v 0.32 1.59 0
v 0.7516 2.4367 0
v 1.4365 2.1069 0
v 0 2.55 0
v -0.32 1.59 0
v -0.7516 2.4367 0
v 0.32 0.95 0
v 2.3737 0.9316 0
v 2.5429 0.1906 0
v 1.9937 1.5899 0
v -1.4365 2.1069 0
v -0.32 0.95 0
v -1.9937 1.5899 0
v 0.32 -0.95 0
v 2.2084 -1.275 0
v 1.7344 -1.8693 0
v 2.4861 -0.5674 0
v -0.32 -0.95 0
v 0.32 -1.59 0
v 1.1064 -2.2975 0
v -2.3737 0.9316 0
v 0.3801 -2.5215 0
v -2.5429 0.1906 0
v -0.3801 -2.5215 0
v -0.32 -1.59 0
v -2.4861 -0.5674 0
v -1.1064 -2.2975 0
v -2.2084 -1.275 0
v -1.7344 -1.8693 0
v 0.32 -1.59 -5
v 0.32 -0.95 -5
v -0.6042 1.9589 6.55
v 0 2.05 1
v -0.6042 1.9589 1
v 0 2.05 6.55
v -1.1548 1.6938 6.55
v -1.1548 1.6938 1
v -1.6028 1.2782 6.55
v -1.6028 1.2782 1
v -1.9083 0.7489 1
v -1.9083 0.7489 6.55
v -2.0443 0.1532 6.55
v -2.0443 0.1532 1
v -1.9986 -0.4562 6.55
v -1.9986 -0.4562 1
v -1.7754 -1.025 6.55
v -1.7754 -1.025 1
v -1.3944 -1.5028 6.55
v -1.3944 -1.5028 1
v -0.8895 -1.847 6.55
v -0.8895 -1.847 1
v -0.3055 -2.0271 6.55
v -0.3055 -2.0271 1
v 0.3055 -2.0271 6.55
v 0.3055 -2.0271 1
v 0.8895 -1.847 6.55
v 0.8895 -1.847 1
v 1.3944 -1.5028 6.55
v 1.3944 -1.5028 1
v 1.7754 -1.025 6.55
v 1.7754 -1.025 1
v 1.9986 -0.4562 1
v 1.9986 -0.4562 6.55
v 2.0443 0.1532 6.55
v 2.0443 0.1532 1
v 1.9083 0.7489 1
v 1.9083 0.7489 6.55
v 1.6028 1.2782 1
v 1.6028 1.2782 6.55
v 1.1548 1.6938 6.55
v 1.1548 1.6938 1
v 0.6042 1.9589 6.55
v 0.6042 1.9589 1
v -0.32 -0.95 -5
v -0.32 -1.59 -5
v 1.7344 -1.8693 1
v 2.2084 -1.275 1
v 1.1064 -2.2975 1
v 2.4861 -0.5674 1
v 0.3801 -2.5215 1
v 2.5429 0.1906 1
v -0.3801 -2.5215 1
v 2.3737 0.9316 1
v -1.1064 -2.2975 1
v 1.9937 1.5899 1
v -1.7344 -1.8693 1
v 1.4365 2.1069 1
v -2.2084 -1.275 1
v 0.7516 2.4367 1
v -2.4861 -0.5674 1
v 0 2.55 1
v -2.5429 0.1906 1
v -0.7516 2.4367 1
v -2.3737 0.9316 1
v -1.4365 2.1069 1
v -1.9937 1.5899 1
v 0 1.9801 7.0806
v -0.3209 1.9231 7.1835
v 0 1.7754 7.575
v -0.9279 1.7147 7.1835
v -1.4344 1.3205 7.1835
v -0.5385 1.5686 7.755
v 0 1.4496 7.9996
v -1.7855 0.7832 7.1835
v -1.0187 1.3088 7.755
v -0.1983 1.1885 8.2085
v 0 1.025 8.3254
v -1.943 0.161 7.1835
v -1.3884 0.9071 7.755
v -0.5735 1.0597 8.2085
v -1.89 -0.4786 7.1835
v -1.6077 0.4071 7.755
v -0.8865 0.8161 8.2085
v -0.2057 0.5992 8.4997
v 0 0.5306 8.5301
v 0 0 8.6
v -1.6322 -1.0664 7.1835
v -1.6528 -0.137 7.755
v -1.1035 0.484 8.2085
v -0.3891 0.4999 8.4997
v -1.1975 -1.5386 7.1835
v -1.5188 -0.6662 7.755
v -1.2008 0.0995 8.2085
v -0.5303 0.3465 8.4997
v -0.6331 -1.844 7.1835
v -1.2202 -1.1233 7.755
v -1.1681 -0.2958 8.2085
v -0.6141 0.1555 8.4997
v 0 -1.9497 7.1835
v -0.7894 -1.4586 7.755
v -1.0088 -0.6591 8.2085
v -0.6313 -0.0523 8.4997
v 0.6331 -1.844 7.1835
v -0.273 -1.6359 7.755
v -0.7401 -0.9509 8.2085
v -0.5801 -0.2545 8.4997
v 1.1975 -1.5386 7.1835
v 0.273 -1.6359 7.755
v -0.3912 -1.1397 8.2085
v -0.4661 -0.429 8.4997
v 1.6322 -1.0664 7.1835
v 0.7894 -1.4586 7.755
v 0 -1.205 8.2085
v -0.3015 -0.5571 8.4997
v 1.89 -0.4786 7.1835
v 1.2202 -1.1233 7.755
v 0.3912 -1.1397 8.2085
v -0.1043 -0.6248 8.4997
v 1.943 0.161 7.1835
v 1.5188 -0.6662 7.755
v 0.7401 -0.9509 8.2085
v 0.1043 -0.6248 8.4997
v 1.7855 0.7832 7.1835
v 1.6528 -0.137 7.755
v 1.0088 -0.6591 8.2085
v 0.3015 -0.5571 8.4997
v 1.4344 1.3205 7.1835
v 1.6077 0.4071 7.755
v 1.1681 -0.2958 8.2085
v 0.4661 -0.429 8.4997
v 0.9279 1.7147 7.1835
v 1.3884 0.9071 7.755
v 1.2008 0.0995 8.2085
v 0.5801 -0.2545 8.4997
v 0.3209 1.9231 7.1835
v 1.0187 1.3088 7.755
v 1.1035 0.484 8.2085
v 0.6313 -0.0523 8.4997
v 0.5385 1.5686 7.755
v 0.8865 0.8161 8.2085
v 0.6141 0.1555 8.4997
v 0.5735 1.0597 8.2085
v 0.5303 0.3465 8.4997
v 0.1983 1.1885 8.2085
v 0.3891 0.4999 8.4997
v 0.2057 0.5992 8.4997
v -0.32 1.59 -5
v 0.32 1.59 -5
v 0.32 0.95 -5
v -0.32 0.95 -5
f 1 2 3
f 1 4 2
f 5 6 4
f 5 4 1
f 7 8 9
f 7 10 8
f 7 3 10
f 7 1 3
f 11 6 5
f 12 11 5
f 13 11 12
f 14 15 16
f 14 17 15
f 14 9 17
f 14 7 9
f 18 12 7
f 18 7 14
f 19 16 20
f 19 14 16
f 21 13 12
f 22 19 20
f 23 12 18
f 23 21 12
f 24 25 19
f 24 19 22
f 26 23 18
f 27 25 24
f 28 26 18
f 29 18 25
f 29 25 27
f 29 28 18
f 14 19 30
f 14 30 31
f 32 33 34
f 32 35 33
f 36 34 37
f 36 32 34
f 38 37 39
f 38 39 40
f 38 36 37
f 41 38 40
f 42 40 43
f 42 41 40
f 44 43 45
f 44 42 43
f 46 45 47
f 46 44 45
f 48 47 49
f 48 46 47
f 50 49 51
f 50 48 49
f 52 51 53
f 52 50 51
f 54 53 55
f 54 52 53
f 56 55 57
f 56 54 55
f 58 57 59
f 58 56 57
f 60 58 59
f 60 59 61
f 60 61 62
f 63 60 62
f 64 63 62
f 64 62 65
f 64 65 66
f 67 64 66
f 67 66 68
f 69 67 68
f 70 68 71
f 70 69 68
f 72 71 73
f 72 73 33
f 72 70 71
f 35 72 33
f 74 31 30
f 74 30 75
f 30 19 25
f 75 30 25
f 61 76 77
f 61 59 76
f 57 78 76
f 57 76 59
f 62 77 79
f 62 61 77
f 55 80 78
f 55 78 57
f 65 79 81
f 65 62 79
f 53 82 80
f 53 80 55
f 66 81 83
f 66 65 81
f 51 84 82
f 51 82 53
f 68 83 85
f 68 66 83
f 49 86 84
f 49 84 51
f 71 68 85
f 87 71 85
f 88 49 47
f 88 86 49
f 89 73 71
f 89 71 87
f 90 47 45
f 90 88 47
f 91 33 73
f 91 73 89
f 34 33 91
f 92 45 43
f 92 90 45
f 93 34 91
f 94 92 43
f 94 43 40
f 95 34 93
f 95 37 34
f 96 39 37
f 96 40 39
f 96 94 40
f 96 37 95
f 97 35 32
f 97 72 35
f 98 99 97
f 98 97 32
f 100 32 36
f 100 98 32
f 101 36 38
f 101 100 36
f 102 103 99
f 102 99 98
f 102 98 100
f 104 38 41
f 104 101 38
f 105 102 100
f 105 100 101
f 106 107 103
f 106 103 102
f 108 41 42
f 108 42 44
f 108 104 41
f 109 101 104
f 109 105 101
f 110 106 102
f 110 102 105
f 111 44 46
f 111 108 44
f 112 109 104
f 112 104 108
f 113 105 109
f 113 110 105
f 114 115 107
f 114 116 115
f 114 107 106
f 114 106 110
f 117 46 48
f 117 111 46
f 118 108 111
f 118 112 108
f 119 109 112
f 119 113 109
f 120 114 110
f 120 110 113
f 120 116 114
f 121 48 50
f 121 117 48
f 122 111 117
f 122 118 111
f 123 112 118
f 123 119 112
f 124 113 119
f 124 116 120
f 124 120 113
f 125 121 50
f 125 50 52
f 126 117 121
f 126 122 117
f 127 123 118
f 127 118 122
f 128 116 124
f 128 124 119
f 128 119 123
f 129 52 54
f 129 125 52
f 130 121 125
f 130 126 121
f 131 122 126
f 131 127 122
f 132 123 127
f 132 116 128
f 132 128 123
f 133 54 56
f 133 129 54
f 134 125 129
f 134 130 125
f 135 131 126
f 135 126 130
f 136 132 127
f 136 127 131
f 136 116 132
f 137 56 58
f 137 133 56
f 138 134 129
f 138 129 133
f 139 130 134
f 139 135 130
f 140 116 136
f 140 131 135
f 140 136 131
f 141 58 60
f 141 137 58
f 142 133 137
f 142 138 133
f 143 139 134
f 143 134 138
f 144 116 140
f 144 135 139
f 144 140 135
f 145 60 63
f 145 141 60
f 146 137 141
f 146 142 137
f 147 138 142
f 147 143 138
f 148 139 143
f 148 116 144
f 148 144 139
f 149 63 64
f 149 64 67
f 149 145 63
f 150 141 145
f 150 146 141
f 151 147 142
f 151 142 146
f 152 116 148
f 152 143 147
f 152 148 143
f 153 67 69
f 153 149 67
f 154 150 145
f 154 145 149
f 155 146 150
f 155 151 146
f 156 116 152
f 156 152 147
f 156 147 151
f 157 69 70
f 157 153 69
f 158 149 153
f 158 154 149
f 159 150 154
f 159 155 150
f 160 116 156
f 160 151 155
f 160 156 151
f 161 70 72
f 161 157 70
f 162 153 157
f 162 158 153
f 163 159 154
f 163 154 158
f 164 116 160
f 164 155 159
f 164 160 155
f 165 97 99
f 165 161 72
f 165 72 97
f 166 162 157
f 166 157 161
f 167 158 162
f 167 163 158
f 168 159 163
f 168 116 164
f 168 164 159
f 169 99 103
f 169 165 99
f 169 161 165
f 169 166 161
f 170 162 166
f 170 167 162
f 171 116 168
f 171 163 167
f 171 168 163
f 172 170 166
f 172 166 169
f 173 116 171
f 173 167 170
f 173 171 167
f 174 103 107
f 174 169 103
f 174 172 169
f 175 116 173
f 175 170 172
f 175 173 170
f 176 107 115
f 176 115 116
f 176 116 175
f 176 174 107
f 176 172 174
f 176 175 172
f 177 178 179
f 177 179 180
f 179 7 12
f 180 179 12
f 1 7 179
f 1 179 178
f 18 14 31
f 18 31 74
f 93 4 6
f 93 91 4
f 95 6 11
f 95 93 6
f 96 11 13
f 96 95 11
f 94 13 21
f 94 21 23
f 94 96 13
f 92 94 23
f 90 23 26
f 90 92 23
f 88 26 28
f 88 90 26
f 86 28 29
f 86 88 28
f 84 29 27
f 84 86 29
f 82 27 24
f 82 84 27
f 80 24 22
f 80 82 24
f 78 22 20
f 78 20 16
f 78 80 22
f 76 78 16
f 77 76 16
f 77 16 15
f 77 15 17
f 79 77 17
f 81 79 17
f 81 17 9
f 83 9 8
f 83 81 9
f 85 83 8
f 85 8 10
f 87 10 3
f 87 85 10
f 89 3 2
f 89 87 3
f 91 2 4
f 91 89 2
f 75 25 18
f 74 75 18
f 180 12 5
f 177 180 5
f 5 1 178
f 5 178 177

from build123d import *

# Parameters (mm, degrees)
SKETCH3_W           = 0.64
SKETCH3_H           = 0.64
BOSS_EXTRUDE1_DEPTH = 5


with BuildPart() as part:
    # Sketch2 → Base-Revolve (revolve)
    with BuildSketch(Plane(origin=(0, 0, 0), x_dir=(0, 0, -1), z_dir=(1, 0, 0))):
        with BuildLine():
            Line((0, 0), (0, 2.55))
            Line((0, 2.55), (-1, 2.55))
            Line((-1, 2.55), (-1, 2.05))
            Line((-1, 2.05), (-6.55, 2.05))
            ThreePointArc((-6.55, 2.05), (-7.999568901, 1.449568901), (-8.6, 0))
            Line((-8.6, 0), (0, 0))
        make_face()
    revolve(axis=Axis((0, 0, 0), (0, 0, 1)))

    # Sketch3 → Boss-Extrude1 (add)
    with BuildSketch(Plane(origin=(0, 0, 0), x_dir=(-1, 0, 0), z_dir=(0, 0, -1))):
        with Locations((0, 1.27)):
            Rectangle(SKETCH3_W, SKETCH3_H)
        with Locations((0, -1.27)):
            Rectangle(SKETCH3_W, SKETCH3_H)
    extrude(amount=BOSS_EXTRUDE1_DEPTH)


solid = part.part
